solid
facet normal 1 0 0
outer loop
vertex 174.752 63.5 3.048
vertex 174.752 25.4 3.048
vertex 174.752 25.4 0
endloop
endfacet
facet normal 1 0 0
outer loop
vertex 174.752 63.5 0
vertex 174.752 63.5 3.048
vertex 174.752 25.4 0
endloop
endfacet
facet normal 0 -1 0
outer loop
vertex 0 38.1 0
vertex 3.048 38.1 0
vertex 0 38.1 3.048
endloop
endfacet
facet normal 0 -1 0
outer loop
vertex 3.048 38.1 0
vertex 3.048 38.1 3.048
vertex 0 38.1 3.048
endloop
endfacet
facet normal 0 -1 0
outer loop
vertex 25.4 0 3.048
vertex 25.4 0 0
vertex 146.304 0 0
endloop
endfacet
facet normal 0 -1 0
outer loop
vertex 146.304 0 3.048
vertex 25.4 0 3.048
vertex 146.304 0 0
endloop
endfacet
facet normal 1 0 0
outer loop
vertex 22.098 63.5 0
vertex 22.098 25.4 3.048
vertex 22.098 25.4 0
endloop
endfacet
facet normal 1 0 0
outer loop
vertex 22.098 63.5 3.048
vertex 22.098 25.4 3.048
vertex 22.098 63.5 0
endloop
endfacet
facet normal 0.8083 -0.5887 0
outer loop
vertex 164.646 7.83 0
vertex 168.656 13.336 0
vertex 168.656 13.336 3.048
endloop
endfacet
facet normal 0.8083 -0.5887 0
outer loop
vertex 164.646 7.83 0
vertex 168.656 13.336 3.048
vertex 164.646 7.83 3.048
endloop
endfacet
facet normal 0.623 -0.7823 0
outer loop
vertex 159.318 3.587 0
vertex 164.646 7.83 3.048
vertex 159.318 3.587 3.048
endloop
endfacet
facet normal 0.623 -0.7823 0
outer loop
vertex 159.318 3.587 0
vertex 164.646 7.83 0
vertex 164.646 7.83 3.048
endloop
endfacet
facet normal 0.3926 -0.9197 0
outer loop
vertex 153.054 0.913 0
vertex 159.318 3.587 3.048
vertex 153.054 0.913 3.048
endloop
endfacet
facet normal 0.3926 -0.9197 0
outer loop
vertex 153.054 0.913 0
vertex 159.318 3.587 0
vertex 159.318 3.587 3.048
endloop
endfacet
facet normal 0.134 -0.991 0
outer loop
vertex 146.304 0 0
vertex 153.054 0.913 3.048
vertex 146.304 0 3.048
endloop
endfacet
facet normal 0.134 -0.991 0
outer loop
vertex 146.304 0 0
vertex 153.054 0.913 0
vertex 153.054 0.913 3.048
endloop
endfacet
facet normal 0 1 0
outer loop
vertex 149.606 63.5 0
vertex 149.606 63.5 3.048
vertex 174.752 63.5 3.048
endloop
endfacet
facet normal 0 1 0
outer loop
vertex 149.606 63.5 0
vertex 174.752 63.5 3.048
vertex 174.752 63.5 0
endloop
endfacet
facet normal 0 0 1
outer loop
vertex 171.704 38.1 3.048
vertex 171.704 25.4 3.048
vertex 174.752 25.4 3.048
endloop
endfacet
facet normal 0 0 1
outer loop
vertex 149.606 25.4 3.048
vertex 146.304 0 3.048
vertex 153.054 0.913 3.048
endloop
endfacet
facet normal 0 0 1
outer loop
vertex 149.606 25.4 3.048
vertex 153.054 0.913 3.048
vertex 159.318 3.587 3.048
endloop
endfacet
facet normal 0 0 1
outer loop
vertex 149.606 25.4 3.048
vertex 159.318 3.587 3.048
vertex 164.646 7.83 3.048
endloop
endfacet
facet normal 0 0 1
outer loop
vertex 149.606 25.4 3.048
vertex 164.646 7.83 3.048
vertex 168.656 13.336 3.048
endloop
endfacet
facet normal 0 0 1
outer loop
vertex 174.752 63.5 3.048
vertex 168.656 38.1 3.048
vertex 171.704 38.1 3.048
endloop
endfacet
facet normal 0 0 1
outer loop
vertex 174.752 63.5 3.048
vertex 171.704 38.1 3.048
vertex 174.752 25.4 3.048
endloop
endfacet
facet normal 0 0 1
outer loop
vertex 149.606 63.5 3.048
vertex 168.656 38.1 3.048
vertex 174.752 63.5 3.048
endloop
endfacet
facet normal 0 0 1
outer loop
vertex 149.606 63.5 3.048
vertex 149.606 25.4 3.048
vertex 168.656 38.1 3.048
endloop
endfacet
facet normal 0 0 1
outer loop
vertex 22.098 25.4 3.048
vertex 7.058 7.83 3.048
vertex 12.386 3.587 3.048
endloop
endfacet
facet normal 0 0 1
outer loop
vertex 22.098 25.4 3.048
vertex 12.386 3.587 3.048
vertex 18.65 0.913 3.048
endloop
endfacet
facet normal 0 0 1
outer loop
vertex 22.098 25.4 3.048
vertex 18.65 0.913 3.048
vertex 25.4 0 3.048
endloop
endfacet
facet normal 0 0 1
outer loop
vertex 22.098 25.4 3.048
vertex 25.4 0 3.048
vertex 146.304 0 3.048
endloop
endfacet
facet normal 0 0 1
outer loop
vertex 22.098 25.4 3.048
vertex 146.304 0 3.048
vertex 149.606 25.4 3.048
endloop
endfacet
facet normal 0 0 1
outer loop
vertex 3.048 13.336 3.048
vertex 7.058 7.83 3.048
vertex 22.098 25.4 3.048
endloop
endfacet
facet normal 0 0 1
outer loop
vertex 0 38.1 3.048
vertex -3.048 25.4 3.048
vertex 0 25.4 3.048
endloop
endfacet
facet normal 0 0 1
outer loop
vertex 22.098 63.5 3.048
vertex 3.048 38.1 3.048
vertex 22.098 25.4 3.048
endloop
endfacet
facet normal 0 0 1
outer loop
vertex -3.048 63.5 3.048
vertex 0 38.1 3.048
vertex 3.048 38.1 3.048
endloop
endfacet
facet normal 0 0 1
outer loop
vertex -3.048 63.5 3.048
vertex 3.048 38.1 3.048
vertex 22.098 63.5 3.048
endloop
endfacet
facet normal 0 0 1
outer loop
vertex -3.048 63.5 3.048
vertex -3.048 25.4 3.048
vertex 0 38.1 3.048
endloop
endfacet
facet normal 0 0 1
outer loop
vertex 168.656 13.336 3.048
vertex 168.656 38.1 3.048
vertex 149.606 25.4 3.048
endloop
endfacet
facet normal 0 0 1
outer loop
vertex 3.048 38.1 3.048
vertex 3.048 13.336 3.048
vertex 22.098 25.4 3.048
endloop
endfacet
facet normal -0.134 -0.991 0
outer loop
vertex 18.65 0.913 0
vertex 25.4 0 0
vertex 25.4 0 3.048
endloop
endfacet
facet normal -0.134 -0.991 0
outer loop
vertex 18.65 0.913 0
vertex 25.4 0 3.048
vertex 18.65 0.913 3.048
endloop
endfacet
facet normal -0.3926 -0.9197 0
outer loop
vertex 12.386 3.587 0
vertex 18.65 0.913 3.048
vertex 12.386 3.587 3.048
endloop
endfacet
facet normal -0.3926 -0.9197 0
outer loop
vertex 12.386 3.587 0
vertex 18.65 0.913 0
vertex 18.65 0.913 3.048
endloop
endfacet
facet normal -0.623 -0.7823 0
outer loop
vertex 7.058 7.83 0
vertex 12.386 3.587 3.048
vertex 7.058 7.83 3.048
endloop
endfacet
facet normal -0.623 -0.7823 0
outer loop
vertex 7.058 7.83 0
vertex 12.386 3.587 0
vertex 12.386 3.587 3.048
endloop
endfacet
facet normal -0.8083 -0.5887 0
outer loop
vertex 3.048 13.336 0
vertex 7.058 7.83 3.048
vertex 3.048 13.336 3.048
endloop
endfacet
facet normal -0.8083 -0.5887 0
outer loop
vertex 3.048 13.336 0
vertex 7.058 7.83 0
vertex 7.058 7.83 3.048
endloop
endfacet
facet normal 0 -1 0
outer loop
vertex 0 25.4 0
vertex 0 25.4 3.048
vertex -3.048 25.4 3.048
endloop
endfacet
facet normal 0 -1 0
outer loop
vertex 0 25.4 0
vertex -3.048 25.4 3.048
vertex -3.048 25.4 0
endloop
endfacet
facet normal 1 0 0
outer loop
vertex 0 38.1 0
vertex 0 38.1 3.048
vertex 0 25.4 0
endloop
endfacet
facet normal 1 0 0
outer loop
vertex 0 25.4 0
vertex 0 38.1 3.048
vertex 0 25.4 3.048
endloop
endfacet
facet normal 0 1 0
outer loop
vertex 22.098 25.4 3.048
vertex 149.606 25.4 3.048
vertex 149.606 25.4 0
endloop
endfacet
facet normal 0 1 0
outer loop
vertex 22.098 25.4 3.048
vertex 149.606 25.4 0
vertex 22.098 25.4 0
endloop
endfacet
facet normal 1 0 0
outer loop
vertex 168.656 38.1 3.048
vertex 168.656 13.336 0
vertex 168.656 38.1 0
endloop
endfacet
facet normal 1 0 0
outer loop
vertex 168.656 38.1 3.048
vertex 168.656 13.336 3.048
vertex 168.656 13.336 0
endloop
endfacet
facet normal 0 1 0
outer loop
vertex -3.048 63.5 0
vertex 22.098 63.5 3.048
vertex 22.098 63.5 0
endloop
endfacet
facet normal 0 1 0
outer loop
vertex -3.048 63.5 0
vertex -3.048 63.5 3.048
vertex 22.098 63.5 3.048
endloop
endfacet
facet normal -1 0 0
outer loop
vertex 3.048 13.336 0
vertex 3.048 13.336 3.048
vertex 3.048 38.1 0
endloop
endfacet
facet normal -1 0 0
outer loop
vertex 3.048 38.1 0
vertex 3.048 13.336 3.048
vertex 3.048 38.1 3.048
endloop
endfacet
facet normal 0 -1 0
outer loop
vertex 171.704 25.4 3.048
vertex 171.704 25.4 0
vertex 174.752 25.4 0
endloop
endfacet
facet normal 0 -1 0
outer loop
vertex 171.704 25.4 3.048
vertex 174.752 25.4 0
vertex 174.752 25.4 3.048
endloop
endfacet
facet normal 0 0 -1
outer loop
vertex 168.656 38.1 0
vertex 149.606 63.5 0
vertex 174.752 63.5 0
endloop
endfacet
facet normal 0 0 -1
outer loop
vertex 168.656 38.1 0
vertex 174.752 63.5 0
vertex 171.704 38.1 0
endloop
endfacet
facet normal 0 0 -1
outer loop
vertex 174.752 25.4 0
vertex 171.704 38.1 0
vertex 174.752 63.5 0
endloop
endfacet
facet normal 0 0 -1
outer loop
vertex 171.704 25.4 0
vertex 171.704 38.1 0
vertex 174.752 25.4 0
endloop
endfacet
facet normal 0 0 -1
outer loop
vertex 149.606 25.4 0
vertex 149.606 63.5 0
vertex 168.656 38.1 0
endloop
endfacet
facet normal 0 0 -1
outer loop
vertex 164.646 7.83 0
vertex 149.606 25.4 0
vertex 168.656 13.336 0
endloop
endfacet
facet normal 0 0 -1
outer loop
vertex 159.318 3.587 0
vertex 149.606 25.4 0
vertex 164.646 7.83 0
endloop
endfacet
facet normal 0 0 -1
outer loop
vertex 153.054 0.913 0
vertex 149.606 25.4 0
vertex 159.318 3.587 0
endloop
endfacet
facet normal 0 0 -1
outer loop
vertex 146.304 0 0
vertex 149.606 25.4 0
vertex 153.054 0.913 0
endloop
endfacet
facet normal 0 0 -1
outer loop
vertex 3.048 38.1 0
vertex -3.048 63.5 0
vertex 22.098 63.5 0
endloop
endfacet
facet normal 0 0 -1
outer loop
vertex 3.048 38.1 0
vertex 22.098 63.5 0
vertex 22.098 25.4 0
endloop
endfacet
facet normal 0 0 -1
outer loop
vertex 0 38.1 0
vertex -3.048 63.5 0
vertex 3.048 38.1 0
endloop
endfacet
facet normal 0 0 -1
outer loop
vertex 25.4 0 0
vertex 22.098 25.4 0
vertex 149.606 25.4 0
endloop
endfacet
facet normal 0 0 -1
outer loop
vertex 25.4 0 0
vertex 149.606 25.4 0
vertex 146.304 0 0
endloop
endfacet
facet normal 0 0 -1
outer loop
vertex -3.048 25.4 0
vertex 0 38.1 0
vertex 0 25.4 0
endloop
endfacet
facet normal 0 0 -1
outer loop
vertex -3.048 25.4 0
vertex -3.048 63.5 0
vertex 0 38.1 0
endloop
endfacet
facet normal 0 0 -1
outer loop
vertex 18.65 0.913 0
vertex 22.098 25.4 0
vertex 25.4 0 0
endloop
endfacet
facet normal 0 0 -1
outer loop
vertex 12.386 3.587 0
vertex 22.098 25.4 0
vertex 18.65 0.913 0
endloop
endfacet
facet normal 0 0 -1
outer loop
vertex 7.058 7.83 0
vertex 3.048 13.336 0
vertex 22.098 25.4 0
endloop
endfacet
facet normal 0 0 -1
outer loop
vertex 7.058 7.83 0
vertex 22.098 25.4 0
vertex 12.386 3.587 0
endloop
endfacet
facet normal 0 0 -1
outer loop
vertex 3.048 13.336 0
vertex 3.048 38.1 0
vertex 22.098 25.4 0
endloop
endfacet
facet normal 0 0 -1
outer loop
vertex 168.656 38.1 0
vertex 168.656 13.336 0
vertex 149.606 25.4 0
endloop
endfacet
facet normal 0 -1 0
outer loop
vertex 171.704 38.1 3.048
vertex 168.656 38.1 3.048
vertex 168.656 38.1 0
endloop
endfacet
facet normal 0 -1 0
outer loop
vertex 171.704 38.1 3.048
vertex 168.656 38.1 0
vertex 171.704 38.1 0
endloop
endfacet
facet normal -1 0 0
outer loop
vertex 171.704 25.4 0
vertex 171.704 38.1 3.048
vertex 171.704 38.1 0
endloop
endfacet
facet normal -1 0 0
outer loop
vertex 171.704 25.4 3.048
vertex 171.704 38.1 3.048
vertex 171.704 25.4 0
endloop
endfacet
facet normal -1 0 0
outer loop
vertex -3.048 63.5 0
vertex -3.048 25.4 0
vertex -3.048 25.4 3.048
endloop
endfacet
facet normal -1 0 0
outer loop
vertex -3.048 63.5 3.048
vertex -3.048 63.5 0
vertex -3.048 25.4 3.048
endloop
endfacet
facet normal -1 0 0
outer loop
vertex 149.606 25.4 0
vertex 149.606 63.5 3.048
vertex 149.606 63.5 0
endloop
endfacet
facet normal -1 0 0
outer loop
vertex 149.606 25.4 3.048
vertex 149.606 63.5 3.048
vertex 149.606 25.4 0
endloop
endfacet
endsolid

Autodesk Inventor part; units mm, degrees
ref_plane "YZ Plane" through (0, 0, 0) normal (1, 0, 0) x (0, 1, 0)
ref_plane "XZ Plane" through (0, 0, 0) normal (0, 1, 0) x (-1, 0, 0)
ref_plane "XY Plane" through (0, 0, 0) normal (0, 0, 1) x (1, 0, 0)
sketch "Sketch1" plane through (0, 0, 0) normal (0, 0, 1) x (1, 0, 0)
  line L0 (0, 0) -> (171.704, 0)
  line L1 (171.704, 0) -> (171.704, 63.5)
  line L2 (171.704, 63.5) -> (0, 63.5)
  line L3 (0, 63.5) -> (0, 0)
  arc A0 (0, 25.4) -> (25.4, 0) centre (25.4, 25.4) ccw
  arc A1 (146.304, 0) -> (171.704, 25.4) centre (146.304, 25.4) ccw
  dimension "d0" = 171.704
  dimension "d1" = 63.5
  dimension "d2" = 50.8
  dimension "d3" = 50.8
extrude "Extrusion1" add sketch "Sketch1" along normal blind 3.048 contours A0 L3 L2 L1 A1 L0
sketch "Sketch3" plane through (0, 25.4, 0) normal (-1, 0, 0) x (0, 0, 1)
  line L0 (0, 38.1) -> (0, 0) projected
  line L1 (3.048, -25.4) -> (3.048, 0) projected
  line L2 (0, 38.1) -> (3.048, 38.1)
  line L3 (3.048, 38.1) -> (3.048, 0)
  line L4 (3.048, 0) -> (0, 0)
  line L5 (0, 0) -> (0, 38.1)
  point P0 (0, -25.4)
extrude "Extrusion3" add sketch "Sketch3" along normal blind 3.048
sketch "Sketch4" plane through (171.704, 25.4, 0) normal (1, 0, 0) x (0, 0, -1)
  line L0 (-3.048, 38.1) -> (0, 38.1) projected
  line L1 (0, 0) -> (0, -25.4) projected
  line L2 (-3.048, 38.1) -> (0, 38.1)
  line L3 (0, 38.1) -> (0, 0)
  line L4 (0, 0) -> (-3.048, 0)
  line L5 (-3.048, 0) -> (-3.048, 38.1)
  point P0 (0, -25.4)
extrude "Extrusion4" add sketch "Sketch4" along normal blind 3.048
sketch "Sketch5" plane through (0, 0, 3.048) normal (0, 0, 1) x (1, 0, 0)
  line L0 (0, 0) -> (3.048, 0)
  line L1 (3.048, 0) -> (3.048, 38.1)
  line L2 (3.048, 38.1) -> (0, 38.1)
  line L3 (0, 38.1) -> (0, 0)
  line L4 (-3.048, 63.5) -> (174.752, 63.5) projected
  line L5 (85.852, 63.5) -> (85.852, 0)
  line L6 (25.4, 0) -> (146.304, 0) projected
  line L7 (171.704, 0) -> (168.656, 0)
  line L8 (168.656, 0) -> (168.656, 38.1)
  line L9 (168.656, 38.1) -> (171.704, 38.1)
  line L10 (171.704, 38.1) -> (171.704, 0)
  point P0 (1.524, 0)
  point P1 (170.18, 0)
  dimension "d17" = 38.1
  dimension "d18" = 3.048
extrude "Extrusion5" cut sketch "Sketch5" against normal through all
sketch "Sketch6" plane through (0, 0, 3.048) normal (0, 0, 1) x (1, 0, 0)
  line L0 (-3.048, 63.5) -> (174.752, 63.5) projected
  line L1 (22.098, 63.5) -> (149.606, 63.5)
  line L2 (149.606, 63.5) -> (149.606, 25.4)
  line L3 (149.606, 25.4) -> (22.098, 25.4)
  line L4 (22.098, 25.4) -> (22.098, 63.5)
  line L5 (3.048, 38.1) -> (3.048, 13.3357) projected
  line L6 (168.656, 13.3357) -> (168.656, 38.1) projected
  line L7 (25.4, 0) -> (146.304, 0) projected
  point P0 (0, 0)
  point P1 (149.606, 63.5)
  dimension "d21" = 19.05
  dimension "d22" = 19.05
  dimension "d23" = 25.4
extrude "Extrusion6" cut sketch "Sketch6" against normal through all
properties part number "Battery_container_main"
